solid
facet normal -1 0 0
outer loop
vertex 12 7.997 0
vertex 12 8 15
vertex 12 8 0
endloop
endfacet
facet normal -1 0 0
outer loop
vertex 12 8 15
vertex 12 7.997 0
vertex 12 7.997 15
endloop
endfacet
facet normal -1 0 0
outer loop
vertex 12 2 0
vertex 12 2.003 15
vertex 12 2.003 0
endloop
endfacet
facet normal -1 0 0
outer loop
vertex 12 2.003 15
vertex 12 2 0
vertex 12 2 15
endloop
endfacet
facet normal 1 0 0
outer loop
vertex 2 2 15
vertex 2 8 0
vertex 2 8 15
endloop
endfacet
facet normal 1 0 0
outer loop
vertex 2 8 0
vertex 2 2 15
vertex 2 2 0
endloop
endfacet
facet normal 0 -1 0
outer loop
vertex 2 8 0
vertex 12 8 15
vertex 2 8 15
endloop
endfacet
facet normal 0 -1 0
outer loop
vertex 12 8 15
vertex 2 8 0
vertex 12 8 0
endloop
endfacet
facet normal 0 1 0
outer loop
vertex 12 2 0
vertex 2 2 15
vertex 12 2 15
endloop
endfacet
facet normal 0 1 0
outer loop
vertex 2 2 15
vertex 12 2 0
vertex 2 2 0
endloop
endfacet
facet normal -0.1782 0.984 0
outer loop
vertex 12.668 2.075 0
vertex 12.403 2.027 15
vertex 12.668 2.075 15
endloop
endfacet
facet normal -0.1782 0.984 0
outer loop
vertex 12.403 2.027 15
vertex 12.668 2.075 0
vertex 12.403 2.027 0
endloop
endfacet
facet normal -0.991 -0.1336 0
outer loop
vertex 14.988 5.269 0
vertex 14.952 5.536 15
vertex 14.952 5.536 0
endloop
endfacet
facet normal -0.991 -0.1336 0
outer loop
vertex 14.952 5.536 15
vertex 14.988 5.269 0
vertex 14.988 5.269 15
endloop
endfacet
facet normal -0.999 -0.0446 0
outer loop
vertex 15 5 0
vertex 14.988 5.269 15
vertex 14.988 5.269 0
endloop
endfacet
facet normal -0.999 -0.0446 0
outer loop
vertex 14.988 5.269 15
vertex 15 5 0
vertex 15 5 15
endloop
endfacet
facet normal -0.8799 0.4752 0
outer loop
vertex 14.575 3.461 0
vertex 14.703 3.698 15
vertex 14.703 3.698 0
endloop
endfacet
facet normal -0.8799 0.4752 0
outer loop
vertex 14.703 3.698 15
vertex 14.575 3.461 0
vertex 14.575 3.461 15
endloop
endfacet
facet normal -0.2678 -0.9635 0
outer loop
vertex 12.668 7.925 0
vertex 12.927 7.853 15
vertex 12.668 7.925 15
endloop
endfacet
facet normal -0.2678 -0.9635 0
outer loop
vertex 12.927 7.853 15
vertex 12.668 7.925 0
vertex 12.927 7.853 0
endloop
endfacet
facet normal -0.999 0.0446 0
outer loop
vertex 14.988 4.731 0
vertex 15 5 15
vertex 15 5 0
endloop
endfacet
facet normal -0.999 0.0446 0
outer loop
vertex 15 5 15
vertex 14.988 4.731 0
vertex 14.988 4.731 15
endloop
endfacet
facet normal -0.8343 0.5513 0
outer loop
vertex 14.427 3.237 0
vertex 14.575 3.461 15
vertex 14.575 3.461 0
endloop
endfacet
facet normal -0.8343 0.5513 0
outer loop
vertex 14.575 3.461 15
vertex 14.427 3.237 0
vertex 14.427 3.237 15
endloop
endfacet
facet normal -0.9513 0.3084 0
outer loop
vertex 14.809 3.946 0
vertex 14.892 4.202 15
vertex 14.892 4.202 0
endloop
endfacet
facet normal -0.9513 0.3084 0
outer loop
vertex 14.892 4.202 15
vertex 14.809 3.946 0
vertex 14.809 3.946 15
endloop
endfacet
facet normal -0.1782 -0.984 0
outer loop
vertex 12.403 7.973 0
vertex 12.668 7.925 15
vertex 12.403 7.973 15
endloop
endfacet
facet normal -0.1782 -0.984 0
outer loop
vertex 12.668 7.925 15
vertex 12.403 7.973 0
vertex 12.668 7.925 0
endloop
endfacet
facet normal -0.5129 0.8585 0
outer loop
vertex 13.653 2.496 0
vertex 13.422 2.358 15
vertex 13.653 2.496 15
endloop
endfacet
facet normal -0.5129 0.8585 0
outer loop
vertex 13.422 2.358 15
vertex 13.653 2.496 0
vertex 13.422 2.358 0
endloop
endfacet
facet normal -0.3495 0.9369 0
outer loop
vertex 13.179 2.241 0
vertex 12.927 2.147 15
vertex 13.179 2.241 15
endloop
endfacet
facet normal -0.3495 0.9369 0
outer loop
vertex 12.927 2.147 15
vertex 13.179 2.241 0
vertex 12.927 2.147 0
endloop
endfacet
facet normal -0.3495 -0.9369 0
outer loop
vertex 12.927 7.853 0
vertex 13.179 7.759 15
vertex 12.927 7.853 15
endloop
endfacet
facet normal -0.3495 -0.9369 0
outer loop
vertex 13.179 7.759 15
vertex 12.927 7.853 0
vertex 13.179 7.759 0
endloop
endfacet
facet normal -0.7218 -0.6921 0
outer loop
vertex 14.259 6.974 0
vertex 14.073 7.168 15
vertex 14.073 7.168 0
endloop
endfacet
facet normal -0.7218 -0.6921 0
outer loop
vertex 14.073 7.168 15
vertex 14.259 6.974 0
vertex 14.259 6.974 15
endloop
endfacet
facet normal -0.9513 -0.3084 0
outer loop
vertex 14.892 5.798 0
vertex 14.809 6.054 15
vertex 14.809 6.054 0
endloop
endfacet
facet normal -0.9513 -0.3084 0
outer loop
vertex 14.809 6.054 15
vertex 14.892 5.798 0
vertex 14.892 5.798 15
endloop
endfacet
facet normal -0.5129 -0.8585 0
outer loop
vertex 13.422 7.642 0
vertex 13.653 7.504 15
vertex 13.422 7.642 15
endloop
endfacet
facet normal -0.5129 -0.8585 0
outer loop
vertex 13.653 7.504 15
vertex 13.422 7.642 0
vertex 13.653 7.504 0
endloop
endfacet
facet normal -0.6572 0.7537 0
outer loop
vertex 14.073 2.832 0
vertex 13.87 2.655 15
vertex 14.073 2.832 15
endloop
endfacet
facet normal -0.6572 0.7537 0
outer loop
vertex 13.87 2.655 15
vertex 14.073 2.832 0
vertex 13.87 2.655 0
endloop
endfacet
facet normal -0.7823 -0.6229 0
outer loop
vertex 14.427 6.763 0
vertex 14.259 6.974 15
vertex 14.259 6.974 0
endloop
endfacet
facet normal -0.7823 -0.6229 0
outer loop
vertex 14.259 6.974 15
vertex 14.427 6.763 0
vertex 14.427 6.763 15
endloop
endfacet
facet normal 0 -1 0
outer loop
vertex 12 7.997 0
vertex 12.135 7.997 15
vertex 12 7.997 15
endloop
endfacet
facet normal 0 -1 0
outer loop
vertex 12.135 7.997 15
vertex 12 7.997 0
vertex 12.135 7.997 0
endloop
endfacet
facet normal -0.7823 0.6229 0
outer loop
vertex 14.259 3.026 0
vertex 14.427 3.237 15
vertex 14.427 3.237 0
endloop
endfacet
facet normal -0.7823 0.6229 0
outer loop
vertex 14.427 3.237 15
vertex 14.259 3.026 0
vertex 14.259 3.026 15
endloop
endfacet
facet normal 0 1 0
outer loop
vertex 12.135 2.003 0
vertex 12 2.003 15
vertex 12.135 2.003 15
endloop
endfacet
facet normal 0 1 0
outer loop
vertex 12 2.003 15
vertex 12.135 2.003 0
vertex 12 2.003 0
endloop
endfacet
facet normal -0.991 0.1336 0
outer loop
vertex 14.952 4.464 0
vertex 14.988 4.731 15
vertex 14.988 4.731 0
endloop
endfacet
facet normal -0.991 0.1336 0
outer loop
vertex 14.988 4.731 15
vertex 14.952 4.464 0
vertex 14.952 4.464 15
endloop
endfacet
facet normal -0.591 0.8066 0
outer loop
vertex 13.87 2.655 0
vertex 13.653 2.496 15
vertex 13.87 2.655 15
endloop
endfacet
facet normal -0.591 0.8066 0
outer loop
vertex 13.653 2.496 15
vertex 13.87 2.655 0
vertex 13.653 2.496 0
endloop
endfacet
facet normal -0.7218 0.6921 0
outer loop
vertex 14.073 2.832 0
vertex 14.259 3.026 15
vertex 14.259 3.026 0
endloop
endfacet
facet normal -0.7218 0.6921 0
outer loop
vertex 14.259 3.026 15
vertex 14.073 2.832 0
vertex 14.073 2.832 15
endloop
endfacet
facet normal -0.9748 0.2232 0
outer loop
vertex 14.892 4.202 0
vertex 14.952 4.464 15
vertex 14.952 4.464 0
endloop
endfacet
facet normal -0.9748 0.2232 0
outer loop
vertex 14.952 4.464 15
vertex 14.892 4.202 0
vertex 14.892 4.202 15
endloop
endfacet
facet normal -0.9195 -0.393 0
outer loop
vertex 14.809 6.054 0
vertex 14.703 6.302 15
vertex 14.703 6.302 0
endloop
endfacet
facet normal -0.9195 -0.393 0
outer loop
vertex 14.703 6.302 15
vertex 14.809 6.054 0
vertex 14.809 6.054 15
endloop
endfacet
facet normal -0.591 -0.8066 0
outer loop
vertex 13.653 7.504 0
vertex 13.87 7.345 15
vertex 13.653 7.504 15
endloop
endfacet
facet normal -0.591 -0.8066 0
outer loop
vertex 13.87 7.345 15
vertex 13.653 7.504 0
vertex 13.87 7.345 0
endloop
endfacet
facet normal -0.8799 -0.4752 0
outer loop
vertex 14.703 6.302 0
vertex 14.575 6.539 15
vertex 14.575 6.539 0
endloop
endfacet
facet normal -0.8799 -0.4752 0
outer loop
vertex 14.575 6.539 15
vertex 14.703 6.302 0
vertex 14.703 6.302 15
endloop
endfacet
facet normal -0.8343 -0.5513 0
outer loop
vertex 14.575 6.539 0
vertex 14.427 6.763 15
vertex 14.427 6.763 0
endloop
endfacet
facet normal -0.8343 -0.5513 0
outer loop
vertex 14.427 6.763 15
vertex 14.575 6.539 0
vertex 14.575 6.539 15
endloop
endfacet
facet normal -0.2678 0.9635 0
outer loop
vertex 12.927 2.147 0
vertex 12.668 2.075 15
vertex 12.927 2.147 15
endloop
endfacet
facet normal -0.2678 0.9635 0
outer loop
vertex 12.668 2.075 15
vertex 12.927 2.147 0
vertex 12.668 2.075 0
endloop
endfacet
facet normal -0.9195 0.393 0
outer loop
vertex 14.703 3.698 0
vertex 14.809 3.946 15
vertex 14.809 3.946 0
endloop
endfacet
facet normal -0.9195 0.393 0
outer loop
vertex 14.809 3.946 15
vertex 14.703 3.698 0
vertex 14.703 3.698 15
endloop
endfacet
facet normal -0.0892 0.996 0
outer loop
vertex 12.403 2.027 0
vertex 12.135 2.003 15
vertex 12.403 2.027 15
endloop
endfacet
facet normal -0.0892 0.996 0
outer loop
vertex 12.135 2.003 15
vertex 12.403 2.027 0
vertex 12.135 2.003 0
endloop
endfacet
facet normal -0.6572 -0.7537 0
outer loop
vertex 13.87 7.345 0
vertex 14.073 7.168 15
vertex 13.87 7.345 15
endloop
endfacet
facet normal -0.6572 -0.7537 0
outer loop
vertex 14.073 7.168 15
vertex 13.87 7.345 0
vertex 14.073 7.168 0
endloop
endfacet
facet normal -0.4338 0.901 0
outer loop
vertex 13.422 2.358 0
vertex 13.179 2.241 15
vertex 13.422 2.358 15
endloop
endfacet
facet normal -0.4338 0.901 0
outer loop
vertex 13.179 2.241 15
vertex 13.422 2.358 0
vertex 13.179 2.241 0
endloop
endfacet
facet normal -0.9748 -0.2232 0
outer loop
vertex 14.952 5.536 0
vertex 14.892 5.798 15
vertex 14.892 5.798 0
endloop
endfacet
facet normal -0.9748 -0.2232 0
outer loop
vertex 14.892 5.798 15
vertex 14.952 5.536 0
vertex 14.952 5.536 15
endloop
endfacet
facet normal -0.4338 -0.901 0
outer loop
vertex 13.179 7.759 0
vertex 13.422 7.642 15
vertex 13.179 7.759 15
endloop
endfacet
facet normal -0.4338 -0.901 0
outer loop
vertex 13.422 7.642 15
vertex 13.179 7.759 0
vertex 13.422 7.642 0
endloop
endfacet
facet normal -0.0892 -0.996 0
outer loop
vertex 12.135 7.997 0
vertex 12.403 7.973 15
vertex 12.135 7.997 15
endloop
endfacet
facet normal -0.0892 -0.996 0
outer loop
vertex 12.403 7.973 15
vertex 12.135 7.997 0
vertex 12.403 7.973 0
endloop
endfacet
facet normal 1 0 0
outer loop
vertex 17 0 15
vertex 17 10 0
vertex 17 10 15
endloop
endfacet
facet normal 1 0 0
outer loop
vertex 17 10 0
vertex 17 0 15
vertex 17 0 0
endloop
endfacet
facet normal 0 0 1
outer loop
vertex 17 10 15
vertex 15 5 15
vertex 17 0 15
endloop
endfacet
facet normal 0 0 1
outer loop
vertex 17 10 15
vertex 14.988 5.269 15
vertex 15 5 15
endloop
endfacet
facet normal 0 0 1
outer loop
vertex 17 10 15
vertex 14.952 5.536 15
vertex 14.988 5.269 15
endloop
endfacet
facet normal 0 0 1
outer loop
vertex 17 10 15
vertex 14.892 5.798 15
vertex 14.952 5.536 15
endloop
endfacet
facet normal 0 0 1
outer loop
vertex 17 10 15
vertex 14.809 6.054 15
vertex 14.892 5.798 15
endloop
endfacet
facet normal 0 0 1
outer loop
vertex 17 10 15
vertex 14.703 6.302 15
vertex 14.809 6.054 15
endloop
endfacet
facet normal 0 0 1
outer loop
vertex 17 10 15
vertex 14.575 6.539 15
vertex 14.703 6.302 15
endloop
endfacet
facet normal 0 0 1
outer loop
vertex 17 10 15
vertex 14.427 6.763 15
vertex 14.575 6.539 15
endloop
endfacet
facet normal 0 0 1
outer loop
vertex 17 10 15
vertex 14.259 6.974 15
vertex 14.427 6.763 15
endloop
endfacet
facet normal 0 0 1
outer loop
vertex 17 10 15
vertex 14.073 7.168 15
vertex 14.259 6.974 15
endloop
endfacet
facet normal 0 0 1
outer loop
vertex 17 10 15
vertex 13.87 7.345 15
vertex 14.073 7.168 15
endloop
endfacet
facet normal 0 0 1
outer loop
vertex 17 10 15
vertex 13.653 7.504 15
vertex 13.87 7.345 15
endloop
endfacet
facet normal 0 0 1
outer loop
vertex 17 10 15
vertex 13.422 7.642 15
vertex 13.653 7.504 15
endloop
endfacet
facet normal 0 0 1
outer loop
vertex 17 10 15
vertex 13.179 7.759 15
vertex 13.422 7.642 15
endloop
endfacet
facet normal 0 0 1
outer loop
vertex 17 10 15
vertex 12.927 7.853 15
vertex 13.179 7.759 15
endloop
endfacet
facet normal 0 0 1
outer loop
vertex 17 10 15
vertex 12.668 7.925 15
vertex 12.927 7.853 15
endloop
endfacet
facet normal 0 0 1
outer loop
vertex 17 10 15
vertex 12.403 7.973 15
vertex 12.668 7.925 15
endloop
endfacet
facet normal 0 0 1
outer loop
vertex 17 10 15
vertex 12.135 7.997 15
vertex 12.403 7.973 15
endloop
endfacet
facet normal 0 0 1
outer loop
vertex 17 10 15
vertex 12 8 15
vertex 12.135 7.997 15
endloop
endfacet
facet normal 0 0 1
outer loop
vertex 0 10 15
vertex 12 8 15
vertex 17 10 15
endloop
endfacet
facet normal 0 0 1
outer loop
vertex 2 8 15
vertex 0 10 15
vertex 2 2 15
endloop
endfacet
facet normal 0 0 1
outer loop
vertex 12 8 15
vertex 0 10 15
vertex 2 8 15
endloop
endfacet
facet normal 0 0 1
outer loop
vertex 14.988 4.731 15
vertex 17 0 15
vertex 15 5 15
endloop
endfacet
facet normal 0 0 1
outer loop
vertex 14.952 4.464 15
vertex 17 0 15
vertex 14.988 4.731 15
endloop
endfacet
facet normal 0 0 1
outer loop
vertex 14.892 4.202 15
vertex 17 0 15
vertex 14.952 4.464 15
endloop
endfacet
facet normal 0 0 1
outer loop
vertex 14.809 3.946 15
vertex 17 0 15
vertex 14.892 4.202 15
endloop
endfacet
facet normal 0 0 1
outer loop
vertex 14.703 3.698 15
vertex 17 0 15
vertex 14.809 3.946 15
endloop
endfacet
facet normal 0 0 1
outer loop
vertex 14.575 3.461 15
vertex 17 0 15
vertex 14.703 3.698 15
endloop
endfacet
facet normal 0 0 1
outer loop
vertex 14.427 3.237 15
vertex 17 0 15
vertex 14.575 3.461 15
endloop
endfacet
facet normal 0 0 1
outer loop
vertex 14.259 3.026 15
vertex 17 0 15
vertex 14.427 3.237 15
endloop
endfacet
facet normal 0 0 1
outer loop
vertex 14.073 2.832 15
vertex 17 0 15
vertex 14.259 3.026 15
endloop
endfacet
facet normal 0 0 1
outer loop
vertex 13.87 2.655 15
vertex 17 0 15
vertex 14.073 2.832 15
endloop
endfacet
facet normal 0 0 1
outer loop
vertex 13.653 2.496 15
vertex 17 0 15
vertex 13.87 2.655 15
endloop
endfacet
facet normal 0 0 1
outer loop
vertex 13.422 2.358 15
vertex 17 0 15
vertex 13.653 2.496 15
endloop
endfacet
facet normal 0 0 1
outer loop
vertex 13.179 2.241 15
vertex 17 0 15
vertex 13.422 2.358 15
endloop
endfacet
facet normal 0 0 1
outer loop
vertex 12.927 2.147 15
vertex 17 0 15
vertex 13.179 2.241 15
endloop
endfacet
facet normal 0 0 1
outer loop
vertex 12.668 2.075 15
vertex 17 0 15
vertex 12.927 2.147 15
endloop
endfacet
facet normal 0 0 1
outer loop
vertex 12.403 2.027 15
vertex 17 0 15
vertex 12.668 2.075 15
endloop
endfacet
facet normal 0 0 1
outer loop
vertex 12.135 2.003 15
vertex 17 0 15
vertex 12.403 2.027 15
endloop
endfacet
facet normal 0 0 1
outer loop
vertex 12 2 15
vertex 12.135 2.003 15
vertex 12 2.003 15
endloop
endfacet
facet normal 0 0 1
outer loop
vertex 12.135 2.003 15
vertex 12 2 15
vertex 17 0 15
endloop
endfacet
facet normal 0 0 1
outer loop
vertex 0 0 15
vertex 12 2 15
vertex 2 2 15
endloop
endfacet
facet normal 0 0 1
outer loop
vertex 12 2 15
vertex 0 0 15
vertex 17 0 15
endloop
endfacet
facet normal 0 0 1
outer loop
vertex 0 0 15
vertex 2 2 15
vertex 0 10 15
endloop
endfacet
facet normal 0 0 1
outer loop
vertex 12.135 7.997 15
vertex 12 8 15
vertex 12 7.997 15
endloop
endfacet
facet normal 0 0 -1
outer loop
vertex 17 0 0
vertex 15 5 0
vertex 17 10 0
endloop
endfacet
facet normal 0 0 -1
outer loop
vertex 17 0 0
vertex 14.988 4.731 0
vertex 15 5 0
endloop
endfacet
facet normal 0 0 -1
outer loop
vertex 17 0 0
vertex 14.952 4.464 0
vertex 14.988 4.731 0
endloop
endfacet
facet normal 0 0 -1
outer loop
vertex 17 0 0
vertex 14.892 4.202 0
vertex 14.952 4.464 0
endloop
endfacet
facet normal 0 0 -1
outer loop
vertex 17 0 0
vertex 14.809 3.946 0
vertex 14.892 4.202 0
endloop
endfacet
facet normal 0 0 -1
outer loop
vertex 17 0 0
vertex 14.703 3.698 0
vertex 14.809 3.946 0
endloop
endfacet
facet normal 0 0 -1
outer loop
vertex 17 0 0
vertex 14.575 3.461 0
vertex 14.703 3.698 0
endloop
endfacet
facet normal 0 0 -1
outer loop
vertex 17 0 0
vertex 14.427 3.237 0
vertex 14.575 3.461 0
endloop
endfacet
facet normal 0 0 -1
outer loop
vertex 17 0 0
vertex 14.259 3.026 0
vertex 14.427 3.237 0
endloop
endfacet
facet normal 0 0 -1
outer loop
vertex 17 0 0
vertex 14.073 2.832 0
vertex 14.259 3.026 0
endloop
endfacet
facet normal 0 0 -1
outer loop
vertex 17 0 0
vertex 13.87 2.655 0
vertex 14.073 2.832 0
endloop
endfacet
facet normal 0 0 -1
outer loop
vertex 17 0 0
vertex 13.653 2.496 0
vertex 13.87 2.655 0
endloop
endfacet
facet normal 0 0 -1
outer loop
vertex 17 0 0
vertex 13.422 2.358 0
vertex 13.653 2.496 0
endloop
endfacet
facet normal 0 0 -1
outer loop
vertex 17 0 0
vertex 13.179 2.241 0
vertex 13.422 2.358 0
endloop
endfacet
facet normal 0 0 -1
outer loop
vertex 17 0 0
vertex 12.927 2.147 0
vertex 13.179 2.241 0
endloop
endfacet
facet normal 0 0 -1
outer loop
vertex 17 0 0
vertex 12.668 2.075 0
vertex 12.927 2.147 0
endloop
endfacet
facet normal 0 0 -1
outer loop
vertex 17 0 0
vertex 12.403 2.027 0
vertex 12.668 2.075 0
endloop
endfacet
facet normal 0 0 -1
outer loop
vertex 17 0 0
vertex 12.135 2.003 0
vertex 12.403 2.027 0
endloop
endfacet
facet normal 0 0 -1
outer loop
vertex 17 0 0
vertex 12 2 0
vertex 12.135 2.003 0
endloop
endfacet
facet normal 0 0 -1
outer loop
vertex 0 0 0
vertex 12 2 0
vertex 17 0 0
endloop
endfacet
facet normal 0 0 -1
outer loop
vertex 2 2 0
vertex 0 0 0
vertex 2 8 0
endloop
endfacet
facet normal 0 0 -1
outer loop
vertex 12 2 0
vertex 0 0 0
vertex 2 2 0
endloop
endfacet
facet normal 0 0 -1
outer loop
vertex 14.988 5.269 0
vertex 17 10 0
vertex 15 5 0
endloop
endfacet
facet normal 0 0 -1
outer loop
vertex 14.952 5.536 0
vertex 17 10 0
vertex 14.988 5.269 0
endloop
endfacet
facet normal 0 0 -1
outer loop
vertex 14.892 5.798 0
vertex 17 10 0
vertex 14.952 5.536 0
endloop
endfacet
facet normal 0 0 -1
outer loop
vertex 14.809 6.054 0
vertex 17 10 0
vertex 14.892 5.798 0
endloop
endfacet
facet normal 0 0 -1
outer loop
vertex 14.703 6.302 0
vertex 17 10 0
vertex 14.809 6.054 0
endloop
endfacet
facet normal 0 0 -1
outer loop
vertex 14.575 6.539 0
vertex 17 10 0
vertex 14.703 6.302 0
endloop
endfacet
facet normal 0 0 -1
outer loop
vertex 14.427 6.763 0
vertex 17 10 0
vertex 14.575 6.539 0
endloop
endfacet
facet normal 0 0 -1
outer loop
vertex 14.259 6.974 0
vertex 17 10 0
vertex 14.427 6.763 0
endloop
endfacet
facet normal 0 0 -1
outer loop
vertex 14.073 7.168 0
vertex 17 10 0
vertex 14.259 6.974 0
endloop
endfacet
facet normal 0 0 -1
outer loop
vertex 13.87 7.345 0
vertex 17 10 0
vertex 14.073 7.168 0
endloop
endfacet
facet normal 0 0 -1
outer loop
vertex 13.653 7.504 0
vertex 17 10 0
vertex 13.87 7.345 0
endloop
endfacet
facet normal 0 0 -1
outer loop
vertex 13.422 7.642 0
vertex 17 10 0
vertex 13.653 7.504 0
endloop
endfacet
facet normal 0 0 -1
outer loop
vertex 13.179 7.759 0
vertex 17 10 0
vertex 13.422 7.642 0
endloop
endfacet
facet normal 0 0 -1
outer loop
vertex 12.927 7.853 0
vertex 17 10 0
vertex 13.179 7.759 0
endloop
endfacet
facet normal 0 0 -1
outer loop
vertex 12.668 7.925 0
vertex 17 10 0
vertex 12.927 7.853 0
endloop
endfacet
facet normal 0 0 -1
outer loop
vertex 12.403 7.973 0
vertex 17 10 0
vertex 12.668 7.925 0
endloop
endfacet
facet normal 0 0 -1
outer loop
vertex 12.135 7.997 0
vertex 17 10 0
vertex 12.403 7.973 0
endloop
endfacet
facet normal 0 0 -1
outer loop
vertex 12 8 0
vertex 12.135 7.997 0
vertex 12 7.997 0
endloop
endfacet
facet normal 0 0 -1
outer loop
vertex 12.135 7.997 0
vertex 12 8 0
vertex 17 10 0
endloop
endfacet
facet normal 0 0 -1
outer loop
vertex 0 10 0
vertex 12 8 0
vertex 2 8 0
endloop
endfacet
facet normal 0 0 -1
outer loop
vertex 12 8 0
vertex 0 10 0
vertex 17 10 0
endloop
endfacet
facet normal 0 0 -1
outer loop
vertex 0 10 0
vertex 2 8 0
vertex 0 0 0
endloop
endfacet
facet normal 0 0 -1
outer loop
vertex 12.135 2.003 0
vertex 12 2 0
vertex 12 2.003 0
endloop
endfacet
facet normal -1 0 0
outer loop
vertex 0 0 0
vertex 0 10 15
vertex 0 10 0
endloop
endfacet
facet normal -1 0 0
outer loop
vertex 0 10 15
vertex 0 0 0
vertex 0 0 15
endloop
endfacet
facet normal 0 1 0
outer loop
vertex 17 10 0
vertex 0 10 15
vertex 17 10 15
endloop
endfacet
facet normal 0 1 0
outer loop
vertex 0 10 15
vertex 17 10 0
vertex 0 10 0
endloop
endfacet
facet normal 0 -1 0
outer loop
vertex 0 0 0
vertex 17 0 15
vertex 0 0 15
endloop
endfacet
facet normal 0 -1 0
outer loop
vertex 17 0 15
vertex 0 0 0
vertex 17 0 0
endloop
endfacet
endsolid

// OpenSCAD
// file: ../../led-strip/led-strip.scad
function neonLikeLedStrip_width() = 6;

function neonLikeLedStrip_height() = 13;

module neonLikeLedStrip(length = 10)
{
    union()
    {
        radius = neonLikeLedStrip_width() / 2.0;

        cubeX = neonLikeLedStrip_height() - radius;

        cubeY = neonLikeLedStrip_width();

        color("white")
        cube([cubeX, cubeY, length]);
    
        color("green")
        translate([cubeX, radius, 0])
        cylinder(r = radius, h= length, $fn = 70);
    }
}
// file: ../neon-like-strip-clasp.scad
use <../led-strip/led-strip.scad>;

module stripClasp(claspThickness = 4,
                  xLength = 88,
                  claspLength = 15)
{
    claspWidth = neonLikeLedStrip_width() + claspThickness; 
 
    union()
    {
        color("lime")
        stripClasp_main(xLength = xLength,
                        claspLength = claspLength,
                        claspThickness = claspThickness,
                        claspWidth = claspWidth
                        );

        stripClasp_screwHolder();
    }
} 

module stripClasp_main(xLength,
                        claspLength,
                        claspThickness,
                        claspWidth)
{
    difference()
    {
        cube([xLength, claspWidth, claspLength ]);
 
        yTranslate = neonLikeLedStrip_width() / 2.0 - 1;
        xTranslate = 2;
        translate([xTranslate, yTranslate, -0.01])
        neonLikeLedStrip(length = 20);
    }
}
 
module stripClasp_screwHolder()
{
    echo("fartooooo");
}
// main file
use <../neon-like-strip-clasp.scad>;

stripClasp(xLength = 17);
